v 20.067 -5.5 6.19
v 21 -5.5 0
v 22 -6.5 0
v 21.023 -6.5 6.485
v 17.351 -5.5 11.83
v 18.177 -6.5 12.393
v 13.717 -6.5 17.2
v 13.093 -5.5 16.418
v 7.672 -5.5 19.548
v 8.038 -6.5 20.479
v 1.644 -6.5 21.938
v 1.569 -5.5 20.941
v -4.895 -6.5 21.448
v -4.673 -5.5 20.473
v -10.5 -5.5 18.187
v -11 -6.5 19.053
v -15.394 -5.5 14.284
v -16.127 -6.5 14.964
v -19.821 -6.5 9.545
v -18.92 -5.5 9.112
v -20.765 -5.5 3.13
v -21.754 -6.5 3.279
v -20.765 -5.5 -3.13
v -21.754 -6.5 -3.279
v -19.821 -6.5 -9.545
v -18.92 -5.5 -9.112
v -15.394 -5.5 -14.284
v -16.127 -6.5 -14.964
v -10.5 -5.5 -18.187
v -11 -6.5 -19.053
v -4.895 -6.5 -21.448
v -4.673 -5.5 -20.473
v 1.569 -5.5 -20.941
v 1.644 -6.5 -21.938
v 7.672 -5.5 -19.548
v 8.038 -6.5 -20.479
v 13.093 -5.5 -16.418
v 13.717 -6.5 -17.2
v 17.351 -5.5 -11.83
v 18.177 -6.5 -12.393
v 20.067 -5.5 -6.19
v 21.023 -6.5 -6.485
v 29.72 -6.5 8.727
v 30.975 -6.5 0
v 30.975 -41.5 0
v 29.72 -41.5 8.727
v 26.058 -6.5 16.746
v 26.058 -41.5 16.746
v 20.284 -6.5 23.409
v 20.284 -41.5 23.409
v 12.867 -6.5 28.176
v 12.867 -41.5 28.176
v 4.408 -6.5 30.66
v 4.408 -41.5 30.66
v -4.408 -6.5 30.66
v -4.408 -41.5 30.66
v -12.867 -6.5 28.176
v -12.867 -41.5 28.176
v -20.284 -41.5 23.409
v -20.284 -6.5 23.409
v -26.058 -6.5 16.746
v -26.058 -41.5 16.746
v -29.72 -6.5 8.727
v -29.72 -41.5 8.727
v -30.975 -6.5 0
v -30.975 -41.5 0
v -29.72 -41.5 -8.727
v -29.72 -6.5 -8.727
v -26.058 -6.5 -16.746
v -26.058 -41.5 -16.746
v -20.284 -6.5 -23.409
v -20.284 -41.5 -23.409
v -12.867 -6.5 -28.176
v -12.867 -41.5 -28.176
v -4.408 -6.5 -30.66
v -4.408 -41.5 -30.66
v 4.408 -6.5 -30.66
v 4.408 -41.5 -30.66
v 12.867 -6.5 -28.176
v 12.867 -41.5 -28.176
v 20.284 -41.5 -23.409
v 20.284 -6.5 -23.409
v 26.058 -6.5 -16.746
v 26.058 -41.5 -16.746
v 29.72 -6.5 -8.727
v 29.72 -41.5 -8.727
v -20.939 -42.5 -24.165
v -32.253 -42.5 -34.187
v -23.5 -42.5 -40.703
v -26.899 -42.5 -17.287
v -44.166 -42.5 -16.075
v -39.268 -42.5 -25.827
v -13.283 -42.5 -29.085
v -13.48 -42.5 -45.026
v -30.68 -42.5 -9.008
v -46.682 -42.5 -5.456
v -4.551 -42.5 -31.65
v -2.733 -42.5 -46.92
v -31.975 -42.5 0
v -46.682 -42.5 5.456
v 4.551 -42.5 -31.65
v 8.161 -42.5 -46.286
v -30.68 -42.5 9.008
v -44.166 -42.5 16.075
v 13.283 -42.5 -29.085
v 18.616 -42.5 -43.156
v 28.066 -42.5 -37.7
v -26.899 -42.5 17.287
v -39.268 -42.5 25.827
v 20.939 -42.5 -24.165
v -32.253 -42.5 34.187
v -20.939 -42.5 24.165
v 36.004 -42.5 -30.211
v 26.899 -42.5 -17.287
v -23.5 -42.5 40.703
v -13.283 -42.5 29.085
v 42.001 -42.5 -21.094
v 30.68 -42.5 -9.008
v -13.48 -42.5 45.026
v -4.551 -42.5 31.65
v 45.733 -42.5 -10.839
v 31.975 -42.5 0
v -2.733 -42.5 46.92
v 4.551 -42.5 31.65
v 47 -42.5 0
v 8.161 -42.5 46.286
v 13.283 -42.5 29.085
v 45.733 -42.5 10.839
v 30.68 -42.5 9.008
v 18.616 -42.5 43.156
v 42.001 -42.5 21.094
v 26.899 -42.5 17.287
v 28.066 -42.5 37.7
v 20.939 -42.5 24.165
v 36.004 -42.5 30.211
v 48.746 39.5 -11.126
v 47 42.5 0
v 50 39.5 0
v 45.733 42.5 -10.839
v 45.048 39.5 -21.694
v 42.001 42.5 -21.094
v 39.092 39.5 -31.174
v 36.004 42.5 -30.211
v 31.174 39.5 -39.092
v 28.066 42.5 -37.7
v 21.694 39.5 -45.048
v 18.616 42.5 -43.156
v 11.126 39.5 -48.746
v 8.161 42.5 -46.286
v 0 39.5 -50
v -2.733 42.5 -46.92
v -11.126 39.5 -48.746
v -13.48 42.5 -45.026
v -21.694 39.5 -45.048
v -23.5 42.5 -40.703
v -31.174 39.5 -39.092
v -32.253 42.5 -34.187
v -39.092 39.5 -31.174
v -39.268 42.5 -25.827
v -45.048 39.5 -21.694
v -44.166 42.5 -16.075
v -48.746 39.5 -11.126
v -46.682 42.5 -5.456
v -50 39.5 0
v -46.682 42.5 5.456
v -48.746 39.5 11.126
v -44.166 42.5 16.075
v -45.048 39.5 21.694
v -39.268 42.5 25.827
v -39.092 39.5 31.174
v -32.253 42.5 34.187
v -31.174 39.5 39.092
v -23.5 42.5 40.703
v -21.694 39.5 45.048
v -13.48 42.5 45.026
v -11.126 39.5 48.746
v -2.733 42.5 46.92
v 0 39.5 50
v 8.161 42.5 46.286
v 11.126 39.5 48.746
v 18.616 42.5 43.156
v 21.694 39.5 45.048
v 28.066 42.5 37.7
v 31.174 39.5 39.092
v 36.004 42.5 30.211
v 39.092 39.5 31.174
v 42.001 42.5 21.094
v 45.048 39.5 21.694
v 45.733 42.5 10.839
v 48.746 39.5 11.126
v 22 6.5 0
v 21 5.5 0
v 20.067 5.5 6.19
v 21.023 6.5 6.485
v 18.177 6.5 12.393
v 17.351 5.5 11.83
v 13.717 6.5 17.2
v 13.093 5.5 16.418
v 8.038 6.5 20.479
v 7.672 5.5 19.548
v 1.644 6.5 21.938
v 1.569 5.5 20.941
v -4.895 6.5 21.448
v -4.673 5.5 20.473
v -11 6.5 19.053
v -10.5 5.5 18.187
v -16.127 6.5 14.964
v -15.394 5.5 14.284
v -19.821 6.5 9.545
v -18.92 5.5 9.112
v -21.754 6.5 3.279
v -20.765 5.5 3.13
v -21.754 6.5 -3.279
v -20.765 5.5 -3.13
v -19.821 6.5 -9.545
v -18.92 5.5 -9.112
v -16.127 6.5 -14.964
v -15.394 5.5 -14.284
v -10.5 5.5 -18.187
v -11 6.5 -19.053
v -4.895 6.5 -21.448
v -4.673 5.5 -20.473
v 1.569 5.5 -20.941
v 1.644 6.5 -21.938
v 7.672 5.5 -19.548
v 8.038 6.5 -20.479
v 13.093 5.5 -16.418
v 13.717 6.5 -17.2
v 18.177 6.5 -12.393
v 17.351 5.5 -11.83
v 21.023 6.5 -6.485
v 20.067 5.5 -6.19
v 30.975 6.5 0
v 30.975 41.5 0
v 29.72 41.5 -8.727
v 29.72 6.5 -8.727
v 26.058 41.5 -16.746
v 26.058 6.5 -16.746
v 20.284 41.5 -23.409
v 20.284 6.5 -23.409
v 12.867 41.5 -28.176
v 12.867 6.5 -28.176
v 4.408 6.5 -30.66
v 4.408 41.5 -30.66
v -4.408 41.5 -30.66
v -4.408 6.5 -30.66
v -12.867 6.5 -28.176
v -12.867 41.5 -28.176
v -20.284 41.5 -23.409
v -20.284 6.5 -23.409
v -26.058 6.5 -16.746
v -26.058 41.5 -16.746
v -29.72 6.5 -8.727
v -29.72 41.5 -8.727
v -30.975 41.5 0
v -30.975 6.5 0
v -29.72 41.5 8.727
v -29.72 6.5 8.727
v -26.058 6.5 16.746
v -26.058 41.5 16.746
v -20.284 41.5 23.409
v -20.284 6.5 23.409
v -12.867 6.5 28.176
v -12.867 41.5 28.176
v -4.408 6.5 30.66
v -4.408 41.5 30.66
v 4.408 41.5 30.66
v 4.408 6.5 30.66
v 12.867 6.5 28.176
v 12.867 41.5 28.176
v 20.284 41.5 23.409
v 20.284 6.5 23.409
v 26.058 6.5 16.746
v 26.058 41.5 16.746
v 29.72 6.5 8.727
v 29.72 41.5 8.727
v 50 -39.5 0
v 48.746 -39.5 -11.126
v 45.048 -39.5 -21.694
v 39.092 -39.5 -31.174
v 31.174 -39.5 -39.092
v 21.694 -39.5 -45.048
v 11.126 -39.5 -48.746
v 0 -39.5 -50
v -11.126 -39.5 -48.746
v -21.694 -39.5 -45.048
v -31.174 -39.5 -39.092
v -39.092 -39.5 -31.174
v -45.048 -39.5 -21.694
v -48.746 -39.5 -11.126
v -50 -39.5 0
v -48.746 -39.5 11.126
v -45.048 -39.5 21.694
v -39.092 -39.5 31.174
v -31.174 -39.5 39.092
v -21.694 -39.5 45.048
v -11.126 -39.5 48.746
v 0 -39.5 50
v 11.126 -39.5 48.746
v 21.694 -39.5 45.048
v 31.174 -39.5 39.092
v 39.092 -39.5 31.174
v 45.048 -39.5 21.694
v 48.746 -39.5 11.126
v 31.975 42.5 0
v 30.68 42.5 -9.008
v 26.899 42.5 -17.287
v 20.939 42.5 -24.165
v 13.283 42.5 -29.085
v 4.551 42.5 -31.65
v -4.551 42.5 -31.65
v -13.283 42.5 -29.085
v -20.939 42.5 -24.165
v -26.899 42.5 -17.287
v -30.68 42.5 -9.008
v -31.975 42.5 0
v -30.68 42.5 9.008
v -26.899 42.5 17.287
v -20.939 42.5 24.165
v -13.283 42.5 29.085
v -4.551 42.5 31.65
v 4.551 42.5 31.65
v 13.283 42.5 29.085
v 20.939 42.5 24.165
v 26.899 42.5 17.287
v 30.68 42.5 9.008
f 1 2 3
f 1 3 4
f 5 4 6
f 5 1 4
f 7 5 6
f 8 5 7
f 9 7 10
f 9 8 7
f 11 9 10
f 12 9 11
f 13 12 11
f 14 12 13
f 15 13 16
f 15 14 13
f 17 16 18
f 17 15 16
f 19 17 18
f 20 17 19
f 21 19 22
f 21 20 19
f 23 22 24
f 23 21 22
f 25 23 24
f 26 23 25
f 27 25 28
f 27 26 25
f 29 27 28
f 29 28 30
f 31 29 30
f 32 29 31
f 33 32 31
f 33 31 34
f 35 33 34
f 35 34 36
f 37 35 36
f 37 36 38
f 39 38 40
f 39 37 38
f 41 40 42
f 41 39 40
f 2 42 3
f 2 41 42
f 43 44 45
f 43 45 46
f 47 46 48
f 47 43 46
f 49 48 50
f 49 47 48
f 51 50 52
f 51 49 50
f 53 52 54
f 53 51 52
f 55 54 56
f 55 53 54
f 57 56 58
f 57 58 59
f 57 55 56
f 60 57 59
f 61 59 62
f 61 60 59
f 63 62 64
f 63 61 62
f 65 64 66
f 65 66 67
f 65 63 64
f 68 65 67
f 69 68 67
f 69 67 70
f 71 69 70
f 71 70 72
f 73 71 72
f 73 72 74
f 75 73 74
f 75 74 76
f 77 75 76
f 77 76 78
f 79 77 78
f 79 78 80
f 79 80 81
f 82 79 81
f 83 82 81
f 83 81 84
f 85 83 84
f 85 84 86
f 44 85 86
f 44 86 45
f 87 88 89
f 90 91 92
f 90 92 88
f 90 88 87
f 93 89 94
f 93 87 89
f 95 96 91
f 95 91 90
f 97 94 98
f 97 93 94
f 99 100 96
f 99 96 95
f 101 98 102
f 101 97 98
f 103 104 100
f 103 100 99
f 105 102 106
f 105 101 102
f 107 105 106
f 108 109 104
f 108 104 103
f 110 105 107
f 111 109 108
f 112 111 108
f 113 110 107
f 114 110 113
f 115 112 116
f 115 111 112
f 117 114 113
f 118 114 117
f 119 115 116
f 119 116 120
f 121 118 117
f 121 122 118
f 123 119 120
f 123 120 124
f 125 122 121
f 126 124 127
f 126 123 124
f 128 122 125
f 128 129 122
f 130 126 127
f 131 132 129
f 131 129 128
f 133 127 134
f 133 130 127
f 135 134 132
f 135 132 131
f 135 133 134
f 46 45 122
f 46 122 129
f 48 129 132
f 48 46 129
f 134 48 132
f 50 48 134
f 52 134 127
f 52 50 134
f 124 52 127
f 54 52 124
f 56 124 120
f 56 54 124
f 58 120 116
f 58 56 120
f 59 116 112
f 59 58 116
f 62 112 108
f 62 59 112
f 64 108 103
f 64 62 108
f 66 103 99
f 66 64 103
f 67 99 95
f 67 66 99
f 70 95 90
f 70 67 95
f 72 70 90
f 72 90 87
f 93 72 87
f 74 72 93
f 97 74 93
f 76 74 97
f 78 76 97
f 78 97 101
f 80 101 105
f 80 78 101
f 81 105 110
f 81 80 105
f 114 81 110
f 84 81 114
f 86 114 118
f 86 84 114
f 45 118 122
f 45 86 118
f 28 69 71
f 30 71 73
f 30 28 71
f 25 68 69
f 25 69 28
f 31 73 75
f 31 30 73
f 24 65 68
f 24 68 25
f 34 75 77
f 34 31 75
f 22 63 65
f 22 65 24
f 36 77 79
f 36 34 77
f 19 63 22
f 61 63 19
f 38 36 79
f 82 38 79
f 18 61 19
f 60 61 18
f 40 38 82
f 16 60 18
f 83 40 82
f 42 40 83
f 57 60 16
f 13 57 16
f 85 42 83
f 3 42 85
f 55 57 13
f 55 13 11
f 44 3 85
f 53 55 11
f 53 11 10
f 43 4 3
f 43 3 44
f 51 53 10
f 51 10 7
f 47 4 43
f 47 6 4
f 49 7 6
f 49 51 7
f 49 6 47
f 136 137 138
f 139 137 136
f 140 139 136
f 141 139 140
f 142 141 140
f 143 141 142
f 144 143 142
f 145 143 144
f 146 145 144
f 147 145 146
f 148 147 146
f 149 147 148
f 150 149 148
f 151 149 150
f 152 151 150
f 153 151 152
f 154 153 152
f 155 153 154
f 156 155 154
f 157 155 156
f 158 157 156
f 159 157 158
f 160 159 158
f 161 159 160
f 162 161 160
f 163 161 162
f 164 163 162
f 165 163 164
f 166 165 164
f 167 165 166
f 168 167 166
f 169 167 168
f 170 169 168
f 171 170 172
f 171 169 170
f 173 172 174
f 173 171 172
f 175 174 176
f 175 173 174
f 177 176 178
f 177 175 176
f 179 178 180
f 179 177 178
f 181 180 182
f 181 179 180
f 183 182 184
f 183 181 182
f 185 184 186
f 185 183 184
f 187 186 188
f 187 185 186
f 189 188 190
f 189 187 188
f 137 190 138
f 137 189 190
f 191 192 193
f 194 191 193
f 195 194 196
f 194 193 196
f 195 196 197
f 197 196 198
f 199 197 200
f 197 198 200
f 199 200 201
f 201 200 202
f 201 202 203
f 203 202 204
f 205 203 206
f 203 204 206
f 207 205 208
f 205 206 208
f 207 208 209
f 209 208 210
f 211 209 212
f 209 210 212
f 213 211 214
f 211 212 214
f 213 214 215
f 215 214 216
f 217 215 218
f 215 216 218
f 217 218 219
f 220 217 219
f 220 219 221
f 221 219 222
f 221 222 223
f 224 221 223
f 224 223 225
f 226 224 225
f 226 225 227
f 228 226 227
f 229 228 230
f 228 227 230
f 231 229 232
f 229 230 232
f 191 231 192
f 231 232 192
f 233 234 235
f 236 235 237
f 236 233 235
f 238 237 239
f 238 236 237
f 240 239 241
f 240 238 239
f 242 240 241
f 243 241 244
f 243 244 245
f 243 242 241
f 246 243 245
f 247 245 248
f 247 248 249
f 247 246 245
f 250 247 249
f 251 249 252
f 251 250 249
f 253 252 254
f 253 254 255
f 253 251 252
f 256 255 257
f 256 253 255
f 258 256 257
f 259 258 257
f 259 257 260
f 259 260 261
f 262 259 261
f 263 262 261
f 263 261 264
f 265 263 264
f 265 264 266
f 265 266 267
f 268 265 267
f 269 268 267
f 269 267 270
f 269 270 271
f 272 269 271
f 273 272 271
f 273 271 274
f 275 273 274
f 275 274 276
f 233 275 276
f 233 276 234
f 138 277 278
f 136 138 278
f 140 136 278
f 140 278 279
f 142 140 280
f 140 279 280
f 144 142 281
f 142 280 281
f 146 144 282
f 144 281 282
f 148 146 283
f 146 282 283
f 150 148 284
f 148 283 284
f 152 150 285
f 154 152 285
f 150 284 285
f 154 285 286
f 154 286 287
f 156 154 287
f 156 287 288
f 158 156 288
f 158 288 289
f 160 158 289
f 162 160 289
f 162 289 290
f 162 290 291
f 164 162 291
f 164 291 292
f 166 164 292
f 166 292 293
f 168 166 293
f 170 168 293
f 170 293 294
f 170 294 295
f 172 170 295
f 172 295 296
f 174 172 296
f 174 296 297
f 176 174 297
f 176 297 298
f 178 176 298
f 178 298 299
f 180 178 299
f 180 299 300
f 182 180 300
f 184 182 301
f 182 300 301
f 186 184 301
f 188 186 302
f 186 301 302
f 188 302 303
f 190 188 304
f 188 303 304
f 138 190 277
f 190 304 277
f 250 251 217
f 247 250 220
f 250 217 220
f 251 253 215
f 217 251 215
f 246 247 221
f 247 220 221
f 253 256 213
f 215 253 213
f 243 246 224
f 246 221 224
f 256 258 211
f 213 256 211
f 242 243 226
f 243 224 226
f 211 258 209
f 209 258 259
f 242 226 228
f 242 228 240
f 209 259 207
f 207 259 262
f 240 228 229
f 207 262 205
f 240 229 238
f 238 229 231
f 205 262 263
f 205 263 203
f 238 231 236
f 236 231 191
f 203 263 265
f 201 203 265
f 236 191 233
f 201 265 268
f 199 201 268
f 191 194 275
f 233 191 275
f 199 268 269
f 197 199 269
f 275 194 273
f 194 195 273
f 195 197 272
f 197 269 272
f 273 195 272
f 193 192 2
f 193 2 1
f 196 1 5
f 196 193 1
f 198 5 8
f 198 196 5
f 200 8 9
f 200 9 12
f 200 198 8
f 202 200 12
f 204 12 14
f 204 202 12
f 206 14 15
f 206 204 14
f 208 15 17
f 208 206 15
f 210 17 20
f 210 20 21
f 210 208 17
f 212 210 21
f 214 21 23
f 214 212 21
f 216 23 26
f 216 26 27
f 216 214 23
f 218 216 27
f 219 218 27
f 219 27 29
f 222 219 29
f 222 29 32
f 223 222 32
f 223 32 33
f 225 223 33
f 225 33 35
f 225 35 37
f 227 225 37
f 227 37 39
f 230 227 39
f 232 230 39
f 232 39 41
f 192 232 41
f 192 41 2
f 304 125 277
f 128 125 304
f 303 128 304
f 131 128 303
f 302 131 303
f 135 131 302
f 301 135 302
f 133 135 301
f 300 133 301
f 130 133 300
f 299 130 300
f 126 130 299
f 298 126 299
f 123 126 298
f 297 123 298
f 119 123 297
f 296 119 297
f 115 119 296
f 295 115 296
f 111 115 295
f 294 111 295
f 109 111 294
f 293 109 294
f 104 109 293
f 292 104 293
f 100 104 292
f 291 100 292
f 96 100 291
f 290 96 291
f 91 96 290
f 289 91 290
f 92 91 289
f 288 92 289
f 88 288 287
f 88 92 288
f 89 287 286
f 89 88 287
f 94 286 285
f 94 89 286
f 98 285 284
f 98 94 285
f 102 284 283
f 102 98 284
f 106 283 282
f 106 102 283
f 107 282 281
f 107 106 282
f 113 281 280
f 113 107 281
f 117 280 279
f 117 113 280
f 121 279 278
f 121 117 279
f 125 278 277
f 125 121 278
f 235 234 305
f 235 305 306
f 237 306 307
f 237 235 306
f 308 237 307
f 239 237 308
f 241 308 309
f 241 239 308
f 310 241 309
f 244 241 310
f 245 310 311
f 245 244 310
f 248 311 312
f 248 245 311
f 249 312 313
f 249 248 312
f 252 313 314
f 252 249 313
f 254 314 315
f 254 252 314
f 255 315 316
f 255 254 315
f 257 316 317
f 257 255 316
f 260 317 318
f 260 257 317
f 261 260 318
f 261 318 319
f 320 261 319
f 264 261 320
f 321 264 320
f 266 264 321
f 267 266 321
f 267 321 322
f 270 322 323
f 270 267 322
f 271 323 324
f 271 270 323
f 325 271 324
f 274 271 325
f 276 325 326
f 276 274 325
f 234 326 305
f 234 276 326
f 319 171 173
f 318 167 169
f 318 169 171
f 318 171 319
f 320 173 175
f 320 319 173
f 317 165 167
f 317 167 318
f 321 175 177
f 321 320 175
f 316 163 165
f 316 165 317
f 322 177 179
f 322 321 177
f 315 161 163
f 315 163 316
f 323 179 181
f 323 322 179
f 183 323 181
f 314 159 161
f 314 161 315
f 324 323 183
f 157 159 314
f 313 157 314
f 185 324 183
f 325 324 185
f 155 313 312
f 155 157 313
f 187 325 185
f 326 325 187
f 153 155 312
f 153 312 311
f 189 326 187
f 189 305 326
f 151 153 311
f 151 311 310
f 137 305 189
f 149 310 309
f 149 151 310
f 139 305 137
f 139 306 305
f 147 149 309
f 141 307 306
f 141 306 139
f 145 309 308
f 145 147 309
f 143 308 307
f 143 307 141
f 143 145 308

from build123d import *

# Parameters (mm, degrees)
F0_R        = 30.975
F0_R_2      = 21
F1_DEPTH    = 6.5
F0_R_3      = 50
F2_DEPTH    = 42.5
F2_FACE_R   = 50
F2_FACE_R_2 = 30.975
F3_DEPTH    = 42.5
F4_SIZE     = 3
F5_SIZE     = 1


with BuildPart() as f1:
    # F0 (on Front) → F1 (new body, symmetric)
    with BuildSketch(Plane.XZ):
        Circle(F0_R)
        Circle(F0_R_2, mode=Mode.SUBTRACT)
    extrude(amount=F1_DEPTH, both=True)

    # F0 (on Front) → F2 (join)
    with BuildSketch(Plane.XZ):
        Circle(F0_R_3)
        Circle(F0_R, mode=Mode.SUBTRACT)
    extrude(amount=F2_DEPTH)

    # F2_face (on face) → F3 (join)
    with BuildSketch(Plane(origin=(0, 0, 0), x_dir=(1, 0, 0), z_dir=(0, 1, 0))):
        Circle(F2_FACE_R)
        Circle(F2_FACE_R_2, mode=Mode.SUBTRACT)
    extrude(amount=F3_DEPTH)

    # F4
    f4_edges = [f1.edges().sort_by_distance(p)[0] for p in [
        (-50, 42.5, 0),
        (-50, -42.5, 0),
    ]]
    chamfer(f4_edges, length=F4_SIZE)

    # F5
    f5_edges = [f1.edges().sort_by_distance(p)[0] for p in [
        (-30.975, 42.5, 0),
        (-21, 6.5, 0),
        (-21, -6.5, 0),
        (-30.975, -42.5, 0),
    ]]
    chamfer(f5_edges, length=F5_SIZE)


solid = f1.part
